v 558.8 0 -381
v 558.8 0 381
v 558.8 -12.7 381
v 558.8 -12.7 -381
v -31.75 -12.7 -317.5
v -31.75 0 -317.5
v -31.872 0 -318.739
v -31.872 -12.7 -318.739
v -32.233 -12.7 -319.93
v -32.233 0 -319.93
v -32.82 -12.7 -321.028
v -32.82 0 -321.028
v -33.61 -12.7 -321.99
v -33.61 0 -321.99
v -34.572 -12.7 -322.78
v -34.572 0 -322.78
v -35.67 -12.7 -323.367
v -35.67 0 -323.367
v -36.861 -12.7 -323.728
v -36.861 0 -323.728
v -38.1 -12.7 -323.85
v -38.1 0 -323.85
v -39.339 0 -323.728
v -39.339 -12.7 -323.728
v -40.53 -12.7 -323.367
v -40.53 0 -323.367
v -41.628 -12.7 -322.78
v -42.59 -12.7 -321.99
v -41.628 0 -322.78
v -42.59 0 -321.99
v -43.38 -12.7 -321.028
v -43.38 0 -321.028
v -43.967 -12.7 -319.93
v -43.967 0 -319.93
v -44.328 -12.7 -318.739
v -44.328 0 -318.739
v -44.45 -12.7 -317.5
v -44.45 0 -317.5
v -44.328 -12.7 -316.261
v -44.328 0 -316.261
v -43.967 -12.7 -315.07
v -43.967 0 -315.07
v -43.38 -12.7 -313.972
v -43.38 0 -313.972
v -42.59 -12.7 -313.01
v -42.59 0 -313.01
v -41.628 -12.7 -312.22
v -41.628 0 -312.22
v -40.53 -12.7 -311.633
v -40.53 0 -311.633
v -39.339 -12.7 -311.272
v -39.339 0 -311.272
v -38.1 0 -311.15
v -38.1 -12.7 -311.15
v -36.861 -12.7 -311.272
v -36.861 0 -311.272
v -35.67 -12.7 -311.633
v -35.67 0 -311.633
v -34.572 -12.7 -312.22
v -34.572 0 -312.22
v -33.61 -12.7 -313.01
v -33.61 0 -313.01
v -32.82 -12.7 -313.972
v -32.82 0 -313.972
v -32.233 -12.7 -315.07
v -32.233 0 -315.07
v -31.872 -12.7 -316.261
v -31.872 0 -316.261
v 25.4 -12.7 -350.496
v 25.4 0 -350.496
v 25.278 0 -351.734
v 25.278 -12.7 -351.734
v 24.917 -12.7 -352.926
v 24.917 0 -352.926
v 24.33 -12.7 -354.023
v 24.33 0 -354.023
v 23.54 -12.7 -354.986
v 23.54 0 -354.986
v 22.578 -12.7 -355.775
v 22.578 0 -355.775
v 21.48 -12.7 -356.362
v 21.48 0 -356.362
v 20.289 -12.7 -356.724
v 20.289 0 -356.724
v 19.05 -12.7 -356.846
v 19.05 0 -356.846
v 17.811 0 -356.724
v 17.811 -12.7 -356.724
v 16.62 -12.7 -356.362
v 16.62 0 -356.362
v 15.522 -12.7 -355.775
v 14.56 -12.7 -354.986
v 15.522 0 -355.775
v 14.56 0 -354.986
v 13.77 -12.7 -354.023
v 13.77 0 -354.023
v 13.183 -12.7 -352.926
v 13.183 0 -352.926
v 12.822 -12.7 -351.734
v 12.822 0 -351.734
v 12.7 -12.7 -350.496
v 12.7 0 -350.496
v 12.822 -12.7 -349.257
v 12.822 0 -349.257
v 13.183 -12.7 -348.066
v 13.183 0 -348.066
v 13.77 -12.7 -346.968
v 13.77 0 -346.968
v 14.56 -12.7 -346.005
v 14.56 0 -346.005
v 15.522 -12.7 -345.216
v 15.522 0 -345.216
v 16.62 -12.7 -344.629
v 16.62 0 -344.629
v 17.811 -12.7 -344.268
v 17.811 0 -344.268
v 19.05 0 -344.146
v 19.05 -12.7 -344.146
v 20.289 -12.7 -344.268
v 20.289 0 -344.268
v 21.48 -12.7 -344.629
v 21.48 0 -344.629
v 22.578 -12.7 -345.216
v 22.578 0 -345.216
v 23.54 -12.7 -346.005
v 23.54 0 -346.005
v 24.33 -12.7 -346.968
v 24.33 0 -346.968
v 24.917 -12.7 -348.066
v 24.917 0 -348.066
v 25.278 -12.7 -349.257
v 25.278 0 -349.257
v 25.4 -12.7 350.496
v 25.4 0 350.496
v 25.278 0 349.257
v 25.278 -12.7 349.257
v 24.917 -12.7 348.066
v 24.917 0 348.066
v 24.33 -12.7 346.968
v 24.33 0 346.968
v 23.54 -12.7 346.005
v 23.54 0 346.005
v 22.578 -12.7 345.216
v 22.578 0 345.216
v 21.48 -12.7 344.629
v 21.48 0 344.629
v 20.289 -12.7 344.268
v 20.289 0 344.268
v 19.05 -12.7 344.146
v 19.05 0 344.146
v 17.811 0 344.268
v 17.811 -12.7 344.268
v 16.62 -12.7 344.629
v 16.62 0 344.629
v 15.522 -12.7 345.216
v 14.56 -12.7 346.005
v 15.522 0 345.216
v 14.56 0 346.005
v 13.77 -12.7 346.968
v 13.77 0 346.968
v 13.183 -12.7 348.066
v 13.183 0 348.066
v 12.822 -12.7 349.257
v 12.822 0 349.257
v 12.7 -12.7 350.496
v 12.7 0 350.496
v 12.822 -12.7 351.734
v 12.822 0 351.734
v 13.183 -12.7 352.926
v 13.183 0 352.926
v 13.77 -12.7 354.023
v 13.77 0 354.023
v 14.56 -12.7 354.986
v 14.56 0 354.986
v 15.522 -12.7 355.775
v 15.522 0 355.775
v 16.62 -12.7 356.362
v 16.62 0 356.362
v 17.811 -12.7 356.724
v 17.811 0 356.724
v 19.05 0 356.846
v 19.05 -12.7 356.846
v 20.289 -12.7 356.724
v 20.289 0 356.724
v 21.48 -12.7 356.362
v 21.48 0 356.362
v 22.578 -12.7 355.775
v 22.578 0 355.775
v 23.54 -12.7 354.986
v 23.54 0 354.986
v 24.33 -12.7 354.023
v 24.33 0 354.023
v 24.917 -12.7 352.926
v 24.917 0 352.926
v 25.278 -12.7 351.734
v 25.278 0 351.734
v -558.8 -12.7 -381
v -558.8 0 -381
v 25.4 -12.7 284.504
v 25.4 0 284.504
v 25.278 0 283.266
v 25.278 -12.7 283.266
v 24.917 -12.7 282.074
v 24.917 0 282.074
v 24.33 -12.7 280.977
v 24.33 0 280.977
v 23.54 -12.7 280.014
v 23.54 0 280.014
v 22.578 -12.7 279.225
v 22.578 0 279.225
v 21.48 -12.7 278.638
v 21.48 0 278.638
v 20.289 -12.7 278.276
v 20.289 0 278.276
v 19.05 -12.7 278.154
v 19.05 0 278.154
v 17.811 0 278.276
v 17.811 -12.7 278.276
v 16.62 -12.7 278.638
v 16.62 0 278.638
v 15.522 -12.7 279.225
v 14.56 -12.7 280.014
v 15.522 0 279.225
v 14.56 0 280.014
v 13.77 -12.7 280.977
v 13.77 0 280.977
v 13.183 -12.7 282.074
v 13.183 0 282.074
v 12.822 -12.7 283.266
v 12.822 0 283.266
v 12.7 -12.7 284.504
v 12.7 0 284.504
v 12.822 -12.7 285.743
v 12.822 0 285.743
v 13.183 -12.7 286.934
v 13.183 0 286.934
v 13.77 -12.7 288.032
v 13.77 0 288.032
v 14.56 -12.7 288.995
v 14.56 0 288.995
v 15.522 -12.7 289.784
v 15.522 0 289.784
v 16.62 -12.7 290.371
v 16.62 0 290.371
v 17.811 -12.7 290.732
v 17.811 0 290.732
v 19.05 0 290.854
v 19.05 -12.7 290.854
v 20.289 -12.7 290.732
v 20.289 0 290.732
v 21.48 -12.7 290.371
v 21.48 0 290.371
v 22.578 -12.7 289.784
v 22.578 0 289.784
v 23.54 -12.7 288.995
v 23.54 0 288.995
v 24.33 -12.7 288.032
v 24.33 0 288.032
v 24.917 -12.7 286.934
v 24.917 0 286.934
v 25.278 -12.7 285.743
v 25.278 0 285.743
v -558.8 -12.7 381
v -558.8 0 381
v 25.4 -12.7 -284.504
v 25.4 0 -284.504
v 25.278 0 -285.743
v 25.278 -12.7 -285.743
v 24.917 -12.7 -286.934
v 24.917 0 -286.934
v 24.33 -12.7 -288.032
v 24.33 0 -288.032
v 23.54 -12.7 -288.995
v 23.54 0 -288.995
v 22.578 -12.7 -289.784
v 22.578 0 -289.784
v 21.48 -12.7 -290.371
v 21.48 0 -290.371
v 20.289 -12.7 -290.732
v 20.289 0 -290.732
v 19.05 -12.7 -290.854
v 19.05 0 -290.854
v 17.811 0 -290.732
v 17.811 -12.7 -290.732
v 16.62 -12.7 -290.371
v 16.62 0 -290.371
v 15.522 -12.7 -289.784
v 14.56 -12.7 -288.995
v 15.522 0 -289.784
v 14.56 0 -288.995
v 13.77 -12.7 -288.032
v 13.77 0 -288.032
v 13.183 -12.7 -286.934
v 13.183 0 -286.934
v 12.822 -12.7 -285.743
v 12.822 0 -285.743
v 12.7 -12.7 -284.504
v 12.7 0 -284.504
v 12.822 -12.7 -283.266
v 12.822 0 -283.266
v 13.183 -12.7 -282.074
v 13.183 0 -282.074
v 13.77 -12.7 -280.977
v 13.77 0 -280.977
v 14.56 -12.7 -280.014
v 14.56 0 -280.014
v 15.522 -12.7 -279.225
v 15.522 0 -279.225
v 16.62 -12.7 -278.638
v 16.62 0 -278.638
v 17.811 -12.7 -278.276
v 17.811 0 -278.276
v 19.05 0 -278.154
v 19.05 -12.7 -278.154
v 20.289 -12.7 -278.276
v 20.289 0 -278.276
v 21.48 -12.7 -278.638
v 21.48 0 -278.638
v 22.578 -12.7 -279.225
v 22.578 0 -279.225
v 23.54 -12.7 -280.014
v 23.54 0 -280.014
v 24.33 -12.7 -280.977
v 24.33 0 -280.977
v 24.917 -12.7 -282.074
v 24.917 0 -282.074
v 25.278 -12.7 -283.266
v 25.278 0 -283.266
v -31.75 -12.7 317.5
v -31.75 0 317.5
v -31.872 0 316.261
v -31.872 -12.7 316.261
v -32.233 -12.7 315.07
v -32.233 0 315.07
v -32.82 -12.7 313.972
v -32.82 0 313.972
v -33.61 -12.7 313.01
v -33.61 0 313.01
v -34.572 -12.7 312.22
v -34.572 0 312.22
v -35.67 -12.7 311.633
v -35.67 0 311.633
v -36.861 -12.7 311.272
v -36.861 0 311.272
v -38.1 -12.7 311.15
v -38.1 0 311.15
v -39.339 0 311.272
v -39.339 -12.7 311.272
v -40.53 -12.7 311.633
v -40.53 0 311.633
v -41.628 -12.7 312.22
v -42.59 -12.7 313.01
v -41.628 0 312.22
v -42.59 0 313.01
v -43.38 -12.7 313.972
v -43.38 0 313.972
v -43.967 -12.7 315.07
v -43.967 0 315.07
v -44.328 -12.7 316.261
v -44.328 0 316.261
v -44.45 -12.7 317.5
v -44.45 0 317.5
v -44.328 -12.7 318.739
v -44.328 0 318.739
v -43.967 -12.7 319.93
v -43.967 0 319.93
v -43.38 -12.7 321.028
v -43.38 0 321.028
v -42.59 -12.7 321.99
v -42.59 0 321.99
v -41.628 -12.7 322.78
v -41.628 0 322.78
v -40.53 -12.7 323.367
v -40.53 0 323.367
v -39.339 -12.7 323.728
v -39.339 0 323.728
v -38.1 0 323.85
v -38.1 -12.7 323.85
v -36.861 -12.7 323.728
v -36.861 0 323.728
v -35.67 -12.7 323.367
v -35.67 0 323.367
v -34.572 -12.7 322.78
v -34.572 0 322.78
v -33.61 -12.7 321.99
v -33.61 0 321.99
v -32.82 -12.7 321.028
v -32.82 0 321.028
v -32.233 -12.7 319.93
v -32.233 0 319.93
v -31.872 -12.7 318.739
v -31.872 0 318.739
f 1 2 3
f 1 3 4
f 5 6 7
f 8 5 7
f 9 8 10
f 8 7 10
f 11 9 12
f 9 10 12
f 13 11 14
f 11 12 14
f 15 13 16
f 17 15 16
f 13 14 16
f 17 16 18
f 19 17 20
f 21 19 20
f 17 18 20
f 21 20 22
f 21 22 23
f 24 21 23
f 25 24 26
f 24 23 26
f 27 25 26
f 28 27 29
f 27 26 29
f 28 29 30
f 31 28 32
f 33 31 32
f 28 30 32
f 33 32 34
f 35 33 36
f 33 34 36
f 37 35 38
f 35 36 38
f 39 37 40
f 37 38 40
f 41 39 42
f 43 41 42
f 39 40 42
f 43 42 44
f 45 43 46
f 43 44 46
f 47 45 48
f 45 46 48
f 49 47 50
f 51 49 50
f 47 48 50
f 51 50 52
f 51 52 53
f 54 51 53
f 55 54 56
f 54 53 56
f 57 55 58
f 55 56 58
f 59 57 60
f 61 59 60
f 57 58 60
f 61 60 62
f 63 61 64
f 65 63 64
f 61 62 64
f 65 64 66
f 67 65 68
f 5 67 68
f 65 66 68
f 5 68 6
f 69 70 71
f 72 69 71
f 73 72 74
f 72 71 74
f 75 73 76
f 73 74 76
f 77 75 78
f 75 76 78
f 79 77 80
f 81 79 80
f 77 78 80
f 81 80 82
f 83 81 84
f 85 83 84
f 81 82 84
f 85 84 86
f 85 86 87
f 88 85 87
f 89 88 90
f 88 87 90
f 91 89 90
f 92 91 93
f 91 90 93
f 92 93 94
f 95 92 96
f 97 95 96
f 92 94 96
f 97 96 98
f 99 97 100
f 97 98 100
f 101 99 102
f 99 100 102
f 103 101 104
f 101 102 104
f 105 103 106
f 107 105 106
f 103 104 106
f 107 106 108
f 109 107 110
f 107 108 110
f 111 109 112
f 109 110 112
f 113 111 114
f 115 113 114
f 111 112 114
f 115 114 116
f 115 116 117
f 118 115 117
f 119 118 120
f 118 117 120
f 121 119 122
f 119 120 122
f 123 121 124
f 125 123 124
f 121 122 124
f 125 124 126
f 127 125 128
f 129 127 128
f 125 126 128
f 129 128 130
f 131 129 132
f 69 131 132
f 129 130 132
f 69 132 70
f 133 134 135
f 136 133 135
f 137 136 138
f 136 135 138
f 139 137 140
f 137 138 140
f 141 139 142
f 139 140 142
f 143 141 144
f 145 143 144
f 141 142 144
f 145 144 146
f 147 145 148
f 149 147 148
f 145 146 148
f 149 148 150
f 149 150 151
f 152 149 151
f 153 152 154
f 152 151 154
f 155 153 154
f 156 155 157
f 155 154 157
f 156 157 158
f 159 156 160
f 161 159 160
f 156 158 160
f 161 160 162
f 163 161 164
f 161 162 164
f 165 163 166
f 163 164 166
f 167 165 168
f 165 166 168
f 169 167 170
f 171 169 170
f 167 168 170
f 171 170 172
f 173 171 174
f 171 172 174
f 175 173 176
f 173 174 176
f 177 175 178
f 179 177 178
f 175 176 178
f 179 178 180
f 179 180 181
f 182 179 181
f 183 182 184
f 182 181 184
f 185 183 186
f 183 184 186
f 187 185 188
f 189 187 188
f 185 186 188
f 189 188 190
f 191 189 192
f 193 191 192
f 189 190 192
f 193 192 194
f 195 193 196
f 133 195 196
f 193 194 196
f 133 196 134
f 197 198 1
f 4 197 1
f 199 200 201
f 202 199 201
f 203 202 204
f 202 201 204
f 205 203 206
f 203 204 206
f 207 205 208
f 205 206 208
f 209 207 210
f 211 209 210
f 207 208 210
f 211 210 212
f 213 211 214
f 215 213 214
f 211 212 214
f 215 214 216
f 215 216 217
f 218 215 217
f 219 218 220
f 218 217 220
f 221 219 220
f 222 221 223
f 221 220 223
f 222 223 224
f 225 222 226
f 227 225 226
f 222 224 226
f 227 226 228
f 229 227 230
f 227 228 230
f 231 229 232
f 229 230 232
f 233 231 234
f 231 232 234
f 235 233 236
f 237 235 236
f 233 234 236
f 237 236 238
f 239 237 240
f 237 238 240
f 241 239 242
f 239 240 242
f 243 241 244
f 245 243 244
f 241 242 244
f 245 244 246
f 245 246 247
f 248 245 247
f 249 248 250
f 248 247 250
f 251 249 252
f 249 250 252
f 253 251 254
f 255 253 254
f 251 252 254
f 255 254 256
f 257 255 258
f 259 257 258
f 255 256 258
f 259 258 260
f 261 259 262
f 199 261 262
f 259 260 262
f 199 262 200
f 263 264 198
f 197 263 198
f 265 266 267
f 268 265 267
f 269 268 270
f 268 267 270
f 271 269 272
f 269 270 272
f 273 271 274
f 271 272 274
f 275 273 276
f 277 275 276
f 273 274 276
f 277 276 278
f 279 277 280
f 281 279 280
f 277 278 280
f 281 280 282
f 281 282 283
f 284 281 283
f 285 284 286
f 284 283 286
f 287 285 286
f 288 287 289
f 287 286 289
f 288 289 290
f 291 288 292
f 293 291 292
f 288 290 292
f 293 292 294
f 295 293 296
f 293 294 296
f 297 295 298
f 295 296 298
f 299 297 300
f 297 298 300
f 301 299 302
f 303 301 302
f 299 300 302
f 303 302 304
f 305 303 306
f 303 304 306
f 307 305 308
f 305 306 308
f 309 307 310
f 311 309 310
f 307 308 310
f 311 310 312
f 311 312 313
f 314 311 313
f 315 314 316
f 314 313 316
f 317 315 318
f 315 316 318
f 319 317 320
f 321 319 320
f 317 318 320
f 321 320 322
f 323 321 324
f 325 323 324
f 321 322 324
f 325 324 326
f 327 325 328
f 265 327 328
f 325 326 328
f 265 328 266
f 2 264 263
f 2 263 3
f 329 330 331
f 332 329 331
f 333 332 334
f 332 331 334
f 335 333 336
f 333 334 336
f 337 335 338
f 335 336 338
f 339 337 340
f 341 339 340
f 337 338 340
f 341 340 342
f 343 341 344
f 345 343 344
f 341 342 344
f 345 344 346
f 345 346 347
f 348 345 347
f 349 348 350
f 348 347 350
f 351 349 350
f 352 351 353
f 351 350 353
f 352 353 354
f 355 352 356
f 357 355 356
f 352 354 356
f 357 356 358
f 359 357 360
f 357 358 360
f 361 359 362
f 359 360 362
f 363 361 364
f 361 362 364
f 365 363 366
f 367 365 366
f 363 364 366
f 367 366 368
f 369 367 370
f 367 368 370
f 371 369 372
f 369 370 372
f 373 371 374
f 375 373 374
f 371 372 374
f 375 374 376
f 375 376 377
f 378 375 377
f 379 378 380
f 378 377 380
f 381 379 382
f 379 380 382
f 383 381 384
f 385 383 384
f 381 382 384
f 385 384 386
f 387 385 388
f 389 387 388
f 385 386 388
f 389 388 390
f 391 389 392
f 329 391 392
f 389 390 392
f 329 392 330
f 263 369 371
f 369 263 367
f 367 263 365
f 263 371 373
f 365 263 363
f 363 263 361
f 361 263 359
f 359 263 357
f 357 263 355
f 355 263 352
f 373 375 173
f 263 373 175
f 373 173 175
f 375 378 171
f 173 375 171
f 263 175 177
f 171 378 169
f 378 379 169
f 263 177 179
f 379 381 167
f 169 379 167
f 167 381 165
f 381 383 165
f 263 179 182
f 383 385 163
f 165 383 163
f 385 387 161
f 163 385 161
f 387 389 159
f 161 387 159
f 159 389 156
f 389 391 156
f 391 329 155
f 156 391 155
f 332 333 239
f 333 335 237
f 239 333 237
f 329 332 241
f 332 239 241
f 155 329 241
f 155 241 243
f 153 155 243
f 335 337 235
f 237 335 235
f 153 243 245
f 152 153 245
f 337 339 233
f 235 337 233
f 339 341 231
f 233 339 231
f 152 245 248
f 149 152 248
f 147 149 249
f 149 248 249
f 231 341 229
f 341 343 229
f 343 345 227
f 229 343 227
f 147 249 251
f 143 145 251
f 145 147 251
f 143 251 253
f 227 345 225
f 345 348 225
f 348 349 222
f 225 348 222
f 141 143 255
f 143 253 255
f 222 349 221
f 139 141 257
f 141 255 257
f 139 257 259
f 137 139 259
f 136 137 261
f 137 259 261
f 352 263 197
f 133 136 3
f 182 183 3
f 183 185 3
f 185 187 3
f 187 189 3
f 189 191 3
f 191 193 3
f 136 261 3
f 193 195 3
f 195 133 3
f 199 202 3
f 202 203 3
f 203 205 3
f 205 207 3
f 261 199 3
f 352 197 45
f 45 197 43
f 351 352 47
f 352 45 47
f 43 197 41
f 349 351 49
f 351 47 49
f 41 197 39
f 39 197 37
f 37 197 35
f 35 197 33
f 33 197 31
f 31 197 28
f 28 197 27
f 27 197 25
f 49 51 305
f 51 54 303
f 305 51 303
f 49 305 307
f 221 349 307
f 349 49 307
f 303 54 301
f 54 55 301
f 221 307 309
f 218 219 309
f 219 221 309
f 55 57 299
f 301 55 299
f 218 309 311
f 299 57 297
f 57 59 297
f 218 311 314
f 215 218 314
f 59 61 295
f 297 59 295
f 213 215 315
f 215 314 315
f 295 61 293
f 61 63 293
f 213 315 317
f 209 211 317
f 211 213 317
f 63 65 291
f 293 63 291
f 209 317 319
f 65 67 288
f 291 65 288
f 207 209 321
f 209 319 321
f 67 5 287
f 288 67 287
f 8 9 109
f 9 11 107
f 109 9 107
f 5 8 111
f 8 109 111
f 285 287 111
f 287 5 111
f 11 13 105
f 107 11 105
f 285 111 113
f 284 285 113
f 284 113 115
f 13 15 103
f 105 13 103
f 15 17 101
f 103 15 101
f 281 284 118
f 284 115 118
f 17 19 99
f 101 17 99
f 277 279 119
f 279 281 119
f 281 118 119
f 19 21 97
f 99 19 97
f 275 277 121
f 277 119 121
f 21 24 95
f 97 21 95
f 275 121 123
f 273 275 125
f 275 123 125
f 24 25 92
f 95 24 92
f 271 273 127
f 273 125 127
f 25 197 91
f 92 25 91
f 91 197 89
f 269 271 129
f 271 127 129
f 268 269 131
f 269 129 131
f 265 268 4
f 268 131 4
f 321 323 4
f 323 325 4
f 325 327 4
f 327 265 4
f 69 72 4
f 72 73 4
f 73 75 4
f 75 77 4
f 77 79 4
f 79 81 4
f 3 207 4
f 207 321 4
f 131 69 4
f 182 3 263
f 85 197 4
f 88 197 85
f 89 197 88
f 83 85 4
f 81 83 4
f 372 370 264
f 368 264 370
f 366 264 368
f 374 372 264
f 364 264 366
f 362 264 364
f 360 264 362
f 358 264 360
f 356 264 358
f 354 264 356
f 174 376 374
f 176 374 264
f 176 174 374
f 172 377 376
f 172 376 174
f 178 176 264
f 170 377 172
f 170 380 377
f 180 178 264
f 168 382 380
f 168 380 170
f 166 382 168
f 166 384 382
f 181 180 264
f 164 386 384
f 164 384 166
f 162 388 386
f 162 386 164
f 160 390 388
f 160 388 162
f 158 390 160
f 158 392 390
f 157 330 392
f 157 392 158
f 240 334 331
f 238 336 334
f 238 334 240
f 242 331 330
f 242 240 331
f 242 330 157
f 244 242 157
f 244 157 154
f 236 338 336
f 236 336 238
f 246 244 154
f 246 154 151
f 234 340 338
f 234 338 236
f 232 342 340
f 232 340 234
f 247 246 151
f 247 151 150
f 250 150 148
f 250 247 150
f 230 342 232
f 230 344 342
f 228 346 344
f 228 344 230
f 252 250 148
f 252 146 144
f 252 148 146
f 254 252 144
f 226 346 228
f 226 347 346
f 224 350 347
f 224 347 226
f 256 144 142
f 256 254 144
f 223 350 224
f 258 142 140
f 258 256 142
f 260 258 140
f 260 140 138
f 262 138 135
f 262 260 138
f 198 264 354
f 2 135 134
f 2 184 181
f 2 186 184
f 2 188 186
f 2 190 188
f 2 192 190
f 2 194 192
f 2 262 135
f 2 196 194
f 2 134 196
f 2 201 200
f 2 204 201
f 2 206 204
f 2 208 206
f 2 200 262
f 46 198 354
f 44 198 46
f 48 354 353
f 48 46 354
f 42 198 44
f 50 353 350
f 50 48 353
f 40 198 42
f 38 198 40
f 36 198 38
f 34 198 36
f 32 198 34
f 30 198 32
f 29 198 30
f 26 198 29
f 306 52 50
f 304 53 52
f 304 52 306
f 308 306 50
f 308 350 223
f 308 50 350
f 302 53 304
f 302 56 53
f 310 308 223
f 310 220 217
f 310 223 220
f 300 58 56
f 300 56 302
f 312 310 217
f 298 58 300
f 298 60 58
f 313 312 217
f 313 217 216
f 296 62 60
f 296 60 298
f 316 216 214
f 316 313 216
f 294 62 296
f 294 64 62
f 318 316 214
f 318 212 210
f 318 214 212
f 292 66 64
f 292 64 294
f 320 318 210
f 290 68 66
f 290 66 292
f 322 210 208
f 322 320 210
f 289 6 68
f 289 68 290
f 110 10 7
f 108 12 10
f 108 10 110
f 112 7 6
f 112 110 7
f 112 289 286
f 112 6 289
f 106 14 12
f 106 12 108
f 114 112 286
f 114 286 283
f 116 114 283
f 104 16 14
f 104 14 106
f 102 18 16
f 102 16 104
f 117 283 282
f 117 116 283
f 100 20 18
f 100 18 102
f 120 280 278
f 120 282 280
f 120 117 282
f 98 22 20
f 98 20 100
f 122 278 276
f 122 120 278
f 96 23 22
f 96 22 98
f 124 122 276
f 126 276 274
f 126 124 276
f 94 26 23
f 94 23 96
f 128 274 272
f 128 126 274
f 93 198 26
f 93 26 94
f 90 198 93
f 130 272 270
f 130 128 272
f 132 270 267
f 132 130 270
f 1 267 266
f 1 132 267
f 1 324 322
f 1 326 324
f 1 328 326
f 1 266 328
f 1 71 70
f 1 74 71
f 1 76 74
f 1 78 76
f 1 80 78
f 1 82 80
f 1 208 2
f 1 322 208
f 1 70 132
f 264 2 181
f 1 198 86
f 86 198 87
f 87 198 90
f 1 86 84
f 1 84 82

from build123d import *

# Parameters (mm, degrees)
SKETCH1_W           = 1117.6
SKETCH1_H           = 762
BOSS_EXTRUDE3_DEPTH = 12.7
SKETCH3_R           = 6.35
CUT_EXTRUDE1_DEPTH  = 12.7


with BuildPart() as part:
    # Sketch1 → Boss-Extrude3 (new body)
    with BuildSketch(Plane(origin=(0, 0, 0), x_dir=(1, 0, 0), z_dir=(0, 1, 0))):
        Rectangle(SKETCH1_W, SKETCH1_H)
    extrude(amount=-BOSS_EXTRUDE3_DEPTH)

    # Sketch3 → Cut-Extrude1 (cut)
    with BuildSketch(Plane(origin=(0, 0, 0), x_dir=(1, 0, 0), z_dir=(0, 1, 0))):
        with Locations((-38.1, 317.5)):
            Circle(SKETCH3_R)
        with Locations((19.05, 350.495567884)):
            Circle(SKETCH3_R)
        with Locations((19.05, 284.504432116)):
            Circle(SKETCH3_R)
        with Locations((19.05, -350.495567884)):
            Circle(SKETCH3_R)
        with Locations((19.05, -284.504432116)):
            Circle(SKETCH3_R)
        with Locations((-38.1, -317.5)):
            Circle(SKETCH3_R)
    extrude(amount=-CUT_EXTRUDE1_DEPTH, mode=Mode.SUBTRACT)


solid = part.part
